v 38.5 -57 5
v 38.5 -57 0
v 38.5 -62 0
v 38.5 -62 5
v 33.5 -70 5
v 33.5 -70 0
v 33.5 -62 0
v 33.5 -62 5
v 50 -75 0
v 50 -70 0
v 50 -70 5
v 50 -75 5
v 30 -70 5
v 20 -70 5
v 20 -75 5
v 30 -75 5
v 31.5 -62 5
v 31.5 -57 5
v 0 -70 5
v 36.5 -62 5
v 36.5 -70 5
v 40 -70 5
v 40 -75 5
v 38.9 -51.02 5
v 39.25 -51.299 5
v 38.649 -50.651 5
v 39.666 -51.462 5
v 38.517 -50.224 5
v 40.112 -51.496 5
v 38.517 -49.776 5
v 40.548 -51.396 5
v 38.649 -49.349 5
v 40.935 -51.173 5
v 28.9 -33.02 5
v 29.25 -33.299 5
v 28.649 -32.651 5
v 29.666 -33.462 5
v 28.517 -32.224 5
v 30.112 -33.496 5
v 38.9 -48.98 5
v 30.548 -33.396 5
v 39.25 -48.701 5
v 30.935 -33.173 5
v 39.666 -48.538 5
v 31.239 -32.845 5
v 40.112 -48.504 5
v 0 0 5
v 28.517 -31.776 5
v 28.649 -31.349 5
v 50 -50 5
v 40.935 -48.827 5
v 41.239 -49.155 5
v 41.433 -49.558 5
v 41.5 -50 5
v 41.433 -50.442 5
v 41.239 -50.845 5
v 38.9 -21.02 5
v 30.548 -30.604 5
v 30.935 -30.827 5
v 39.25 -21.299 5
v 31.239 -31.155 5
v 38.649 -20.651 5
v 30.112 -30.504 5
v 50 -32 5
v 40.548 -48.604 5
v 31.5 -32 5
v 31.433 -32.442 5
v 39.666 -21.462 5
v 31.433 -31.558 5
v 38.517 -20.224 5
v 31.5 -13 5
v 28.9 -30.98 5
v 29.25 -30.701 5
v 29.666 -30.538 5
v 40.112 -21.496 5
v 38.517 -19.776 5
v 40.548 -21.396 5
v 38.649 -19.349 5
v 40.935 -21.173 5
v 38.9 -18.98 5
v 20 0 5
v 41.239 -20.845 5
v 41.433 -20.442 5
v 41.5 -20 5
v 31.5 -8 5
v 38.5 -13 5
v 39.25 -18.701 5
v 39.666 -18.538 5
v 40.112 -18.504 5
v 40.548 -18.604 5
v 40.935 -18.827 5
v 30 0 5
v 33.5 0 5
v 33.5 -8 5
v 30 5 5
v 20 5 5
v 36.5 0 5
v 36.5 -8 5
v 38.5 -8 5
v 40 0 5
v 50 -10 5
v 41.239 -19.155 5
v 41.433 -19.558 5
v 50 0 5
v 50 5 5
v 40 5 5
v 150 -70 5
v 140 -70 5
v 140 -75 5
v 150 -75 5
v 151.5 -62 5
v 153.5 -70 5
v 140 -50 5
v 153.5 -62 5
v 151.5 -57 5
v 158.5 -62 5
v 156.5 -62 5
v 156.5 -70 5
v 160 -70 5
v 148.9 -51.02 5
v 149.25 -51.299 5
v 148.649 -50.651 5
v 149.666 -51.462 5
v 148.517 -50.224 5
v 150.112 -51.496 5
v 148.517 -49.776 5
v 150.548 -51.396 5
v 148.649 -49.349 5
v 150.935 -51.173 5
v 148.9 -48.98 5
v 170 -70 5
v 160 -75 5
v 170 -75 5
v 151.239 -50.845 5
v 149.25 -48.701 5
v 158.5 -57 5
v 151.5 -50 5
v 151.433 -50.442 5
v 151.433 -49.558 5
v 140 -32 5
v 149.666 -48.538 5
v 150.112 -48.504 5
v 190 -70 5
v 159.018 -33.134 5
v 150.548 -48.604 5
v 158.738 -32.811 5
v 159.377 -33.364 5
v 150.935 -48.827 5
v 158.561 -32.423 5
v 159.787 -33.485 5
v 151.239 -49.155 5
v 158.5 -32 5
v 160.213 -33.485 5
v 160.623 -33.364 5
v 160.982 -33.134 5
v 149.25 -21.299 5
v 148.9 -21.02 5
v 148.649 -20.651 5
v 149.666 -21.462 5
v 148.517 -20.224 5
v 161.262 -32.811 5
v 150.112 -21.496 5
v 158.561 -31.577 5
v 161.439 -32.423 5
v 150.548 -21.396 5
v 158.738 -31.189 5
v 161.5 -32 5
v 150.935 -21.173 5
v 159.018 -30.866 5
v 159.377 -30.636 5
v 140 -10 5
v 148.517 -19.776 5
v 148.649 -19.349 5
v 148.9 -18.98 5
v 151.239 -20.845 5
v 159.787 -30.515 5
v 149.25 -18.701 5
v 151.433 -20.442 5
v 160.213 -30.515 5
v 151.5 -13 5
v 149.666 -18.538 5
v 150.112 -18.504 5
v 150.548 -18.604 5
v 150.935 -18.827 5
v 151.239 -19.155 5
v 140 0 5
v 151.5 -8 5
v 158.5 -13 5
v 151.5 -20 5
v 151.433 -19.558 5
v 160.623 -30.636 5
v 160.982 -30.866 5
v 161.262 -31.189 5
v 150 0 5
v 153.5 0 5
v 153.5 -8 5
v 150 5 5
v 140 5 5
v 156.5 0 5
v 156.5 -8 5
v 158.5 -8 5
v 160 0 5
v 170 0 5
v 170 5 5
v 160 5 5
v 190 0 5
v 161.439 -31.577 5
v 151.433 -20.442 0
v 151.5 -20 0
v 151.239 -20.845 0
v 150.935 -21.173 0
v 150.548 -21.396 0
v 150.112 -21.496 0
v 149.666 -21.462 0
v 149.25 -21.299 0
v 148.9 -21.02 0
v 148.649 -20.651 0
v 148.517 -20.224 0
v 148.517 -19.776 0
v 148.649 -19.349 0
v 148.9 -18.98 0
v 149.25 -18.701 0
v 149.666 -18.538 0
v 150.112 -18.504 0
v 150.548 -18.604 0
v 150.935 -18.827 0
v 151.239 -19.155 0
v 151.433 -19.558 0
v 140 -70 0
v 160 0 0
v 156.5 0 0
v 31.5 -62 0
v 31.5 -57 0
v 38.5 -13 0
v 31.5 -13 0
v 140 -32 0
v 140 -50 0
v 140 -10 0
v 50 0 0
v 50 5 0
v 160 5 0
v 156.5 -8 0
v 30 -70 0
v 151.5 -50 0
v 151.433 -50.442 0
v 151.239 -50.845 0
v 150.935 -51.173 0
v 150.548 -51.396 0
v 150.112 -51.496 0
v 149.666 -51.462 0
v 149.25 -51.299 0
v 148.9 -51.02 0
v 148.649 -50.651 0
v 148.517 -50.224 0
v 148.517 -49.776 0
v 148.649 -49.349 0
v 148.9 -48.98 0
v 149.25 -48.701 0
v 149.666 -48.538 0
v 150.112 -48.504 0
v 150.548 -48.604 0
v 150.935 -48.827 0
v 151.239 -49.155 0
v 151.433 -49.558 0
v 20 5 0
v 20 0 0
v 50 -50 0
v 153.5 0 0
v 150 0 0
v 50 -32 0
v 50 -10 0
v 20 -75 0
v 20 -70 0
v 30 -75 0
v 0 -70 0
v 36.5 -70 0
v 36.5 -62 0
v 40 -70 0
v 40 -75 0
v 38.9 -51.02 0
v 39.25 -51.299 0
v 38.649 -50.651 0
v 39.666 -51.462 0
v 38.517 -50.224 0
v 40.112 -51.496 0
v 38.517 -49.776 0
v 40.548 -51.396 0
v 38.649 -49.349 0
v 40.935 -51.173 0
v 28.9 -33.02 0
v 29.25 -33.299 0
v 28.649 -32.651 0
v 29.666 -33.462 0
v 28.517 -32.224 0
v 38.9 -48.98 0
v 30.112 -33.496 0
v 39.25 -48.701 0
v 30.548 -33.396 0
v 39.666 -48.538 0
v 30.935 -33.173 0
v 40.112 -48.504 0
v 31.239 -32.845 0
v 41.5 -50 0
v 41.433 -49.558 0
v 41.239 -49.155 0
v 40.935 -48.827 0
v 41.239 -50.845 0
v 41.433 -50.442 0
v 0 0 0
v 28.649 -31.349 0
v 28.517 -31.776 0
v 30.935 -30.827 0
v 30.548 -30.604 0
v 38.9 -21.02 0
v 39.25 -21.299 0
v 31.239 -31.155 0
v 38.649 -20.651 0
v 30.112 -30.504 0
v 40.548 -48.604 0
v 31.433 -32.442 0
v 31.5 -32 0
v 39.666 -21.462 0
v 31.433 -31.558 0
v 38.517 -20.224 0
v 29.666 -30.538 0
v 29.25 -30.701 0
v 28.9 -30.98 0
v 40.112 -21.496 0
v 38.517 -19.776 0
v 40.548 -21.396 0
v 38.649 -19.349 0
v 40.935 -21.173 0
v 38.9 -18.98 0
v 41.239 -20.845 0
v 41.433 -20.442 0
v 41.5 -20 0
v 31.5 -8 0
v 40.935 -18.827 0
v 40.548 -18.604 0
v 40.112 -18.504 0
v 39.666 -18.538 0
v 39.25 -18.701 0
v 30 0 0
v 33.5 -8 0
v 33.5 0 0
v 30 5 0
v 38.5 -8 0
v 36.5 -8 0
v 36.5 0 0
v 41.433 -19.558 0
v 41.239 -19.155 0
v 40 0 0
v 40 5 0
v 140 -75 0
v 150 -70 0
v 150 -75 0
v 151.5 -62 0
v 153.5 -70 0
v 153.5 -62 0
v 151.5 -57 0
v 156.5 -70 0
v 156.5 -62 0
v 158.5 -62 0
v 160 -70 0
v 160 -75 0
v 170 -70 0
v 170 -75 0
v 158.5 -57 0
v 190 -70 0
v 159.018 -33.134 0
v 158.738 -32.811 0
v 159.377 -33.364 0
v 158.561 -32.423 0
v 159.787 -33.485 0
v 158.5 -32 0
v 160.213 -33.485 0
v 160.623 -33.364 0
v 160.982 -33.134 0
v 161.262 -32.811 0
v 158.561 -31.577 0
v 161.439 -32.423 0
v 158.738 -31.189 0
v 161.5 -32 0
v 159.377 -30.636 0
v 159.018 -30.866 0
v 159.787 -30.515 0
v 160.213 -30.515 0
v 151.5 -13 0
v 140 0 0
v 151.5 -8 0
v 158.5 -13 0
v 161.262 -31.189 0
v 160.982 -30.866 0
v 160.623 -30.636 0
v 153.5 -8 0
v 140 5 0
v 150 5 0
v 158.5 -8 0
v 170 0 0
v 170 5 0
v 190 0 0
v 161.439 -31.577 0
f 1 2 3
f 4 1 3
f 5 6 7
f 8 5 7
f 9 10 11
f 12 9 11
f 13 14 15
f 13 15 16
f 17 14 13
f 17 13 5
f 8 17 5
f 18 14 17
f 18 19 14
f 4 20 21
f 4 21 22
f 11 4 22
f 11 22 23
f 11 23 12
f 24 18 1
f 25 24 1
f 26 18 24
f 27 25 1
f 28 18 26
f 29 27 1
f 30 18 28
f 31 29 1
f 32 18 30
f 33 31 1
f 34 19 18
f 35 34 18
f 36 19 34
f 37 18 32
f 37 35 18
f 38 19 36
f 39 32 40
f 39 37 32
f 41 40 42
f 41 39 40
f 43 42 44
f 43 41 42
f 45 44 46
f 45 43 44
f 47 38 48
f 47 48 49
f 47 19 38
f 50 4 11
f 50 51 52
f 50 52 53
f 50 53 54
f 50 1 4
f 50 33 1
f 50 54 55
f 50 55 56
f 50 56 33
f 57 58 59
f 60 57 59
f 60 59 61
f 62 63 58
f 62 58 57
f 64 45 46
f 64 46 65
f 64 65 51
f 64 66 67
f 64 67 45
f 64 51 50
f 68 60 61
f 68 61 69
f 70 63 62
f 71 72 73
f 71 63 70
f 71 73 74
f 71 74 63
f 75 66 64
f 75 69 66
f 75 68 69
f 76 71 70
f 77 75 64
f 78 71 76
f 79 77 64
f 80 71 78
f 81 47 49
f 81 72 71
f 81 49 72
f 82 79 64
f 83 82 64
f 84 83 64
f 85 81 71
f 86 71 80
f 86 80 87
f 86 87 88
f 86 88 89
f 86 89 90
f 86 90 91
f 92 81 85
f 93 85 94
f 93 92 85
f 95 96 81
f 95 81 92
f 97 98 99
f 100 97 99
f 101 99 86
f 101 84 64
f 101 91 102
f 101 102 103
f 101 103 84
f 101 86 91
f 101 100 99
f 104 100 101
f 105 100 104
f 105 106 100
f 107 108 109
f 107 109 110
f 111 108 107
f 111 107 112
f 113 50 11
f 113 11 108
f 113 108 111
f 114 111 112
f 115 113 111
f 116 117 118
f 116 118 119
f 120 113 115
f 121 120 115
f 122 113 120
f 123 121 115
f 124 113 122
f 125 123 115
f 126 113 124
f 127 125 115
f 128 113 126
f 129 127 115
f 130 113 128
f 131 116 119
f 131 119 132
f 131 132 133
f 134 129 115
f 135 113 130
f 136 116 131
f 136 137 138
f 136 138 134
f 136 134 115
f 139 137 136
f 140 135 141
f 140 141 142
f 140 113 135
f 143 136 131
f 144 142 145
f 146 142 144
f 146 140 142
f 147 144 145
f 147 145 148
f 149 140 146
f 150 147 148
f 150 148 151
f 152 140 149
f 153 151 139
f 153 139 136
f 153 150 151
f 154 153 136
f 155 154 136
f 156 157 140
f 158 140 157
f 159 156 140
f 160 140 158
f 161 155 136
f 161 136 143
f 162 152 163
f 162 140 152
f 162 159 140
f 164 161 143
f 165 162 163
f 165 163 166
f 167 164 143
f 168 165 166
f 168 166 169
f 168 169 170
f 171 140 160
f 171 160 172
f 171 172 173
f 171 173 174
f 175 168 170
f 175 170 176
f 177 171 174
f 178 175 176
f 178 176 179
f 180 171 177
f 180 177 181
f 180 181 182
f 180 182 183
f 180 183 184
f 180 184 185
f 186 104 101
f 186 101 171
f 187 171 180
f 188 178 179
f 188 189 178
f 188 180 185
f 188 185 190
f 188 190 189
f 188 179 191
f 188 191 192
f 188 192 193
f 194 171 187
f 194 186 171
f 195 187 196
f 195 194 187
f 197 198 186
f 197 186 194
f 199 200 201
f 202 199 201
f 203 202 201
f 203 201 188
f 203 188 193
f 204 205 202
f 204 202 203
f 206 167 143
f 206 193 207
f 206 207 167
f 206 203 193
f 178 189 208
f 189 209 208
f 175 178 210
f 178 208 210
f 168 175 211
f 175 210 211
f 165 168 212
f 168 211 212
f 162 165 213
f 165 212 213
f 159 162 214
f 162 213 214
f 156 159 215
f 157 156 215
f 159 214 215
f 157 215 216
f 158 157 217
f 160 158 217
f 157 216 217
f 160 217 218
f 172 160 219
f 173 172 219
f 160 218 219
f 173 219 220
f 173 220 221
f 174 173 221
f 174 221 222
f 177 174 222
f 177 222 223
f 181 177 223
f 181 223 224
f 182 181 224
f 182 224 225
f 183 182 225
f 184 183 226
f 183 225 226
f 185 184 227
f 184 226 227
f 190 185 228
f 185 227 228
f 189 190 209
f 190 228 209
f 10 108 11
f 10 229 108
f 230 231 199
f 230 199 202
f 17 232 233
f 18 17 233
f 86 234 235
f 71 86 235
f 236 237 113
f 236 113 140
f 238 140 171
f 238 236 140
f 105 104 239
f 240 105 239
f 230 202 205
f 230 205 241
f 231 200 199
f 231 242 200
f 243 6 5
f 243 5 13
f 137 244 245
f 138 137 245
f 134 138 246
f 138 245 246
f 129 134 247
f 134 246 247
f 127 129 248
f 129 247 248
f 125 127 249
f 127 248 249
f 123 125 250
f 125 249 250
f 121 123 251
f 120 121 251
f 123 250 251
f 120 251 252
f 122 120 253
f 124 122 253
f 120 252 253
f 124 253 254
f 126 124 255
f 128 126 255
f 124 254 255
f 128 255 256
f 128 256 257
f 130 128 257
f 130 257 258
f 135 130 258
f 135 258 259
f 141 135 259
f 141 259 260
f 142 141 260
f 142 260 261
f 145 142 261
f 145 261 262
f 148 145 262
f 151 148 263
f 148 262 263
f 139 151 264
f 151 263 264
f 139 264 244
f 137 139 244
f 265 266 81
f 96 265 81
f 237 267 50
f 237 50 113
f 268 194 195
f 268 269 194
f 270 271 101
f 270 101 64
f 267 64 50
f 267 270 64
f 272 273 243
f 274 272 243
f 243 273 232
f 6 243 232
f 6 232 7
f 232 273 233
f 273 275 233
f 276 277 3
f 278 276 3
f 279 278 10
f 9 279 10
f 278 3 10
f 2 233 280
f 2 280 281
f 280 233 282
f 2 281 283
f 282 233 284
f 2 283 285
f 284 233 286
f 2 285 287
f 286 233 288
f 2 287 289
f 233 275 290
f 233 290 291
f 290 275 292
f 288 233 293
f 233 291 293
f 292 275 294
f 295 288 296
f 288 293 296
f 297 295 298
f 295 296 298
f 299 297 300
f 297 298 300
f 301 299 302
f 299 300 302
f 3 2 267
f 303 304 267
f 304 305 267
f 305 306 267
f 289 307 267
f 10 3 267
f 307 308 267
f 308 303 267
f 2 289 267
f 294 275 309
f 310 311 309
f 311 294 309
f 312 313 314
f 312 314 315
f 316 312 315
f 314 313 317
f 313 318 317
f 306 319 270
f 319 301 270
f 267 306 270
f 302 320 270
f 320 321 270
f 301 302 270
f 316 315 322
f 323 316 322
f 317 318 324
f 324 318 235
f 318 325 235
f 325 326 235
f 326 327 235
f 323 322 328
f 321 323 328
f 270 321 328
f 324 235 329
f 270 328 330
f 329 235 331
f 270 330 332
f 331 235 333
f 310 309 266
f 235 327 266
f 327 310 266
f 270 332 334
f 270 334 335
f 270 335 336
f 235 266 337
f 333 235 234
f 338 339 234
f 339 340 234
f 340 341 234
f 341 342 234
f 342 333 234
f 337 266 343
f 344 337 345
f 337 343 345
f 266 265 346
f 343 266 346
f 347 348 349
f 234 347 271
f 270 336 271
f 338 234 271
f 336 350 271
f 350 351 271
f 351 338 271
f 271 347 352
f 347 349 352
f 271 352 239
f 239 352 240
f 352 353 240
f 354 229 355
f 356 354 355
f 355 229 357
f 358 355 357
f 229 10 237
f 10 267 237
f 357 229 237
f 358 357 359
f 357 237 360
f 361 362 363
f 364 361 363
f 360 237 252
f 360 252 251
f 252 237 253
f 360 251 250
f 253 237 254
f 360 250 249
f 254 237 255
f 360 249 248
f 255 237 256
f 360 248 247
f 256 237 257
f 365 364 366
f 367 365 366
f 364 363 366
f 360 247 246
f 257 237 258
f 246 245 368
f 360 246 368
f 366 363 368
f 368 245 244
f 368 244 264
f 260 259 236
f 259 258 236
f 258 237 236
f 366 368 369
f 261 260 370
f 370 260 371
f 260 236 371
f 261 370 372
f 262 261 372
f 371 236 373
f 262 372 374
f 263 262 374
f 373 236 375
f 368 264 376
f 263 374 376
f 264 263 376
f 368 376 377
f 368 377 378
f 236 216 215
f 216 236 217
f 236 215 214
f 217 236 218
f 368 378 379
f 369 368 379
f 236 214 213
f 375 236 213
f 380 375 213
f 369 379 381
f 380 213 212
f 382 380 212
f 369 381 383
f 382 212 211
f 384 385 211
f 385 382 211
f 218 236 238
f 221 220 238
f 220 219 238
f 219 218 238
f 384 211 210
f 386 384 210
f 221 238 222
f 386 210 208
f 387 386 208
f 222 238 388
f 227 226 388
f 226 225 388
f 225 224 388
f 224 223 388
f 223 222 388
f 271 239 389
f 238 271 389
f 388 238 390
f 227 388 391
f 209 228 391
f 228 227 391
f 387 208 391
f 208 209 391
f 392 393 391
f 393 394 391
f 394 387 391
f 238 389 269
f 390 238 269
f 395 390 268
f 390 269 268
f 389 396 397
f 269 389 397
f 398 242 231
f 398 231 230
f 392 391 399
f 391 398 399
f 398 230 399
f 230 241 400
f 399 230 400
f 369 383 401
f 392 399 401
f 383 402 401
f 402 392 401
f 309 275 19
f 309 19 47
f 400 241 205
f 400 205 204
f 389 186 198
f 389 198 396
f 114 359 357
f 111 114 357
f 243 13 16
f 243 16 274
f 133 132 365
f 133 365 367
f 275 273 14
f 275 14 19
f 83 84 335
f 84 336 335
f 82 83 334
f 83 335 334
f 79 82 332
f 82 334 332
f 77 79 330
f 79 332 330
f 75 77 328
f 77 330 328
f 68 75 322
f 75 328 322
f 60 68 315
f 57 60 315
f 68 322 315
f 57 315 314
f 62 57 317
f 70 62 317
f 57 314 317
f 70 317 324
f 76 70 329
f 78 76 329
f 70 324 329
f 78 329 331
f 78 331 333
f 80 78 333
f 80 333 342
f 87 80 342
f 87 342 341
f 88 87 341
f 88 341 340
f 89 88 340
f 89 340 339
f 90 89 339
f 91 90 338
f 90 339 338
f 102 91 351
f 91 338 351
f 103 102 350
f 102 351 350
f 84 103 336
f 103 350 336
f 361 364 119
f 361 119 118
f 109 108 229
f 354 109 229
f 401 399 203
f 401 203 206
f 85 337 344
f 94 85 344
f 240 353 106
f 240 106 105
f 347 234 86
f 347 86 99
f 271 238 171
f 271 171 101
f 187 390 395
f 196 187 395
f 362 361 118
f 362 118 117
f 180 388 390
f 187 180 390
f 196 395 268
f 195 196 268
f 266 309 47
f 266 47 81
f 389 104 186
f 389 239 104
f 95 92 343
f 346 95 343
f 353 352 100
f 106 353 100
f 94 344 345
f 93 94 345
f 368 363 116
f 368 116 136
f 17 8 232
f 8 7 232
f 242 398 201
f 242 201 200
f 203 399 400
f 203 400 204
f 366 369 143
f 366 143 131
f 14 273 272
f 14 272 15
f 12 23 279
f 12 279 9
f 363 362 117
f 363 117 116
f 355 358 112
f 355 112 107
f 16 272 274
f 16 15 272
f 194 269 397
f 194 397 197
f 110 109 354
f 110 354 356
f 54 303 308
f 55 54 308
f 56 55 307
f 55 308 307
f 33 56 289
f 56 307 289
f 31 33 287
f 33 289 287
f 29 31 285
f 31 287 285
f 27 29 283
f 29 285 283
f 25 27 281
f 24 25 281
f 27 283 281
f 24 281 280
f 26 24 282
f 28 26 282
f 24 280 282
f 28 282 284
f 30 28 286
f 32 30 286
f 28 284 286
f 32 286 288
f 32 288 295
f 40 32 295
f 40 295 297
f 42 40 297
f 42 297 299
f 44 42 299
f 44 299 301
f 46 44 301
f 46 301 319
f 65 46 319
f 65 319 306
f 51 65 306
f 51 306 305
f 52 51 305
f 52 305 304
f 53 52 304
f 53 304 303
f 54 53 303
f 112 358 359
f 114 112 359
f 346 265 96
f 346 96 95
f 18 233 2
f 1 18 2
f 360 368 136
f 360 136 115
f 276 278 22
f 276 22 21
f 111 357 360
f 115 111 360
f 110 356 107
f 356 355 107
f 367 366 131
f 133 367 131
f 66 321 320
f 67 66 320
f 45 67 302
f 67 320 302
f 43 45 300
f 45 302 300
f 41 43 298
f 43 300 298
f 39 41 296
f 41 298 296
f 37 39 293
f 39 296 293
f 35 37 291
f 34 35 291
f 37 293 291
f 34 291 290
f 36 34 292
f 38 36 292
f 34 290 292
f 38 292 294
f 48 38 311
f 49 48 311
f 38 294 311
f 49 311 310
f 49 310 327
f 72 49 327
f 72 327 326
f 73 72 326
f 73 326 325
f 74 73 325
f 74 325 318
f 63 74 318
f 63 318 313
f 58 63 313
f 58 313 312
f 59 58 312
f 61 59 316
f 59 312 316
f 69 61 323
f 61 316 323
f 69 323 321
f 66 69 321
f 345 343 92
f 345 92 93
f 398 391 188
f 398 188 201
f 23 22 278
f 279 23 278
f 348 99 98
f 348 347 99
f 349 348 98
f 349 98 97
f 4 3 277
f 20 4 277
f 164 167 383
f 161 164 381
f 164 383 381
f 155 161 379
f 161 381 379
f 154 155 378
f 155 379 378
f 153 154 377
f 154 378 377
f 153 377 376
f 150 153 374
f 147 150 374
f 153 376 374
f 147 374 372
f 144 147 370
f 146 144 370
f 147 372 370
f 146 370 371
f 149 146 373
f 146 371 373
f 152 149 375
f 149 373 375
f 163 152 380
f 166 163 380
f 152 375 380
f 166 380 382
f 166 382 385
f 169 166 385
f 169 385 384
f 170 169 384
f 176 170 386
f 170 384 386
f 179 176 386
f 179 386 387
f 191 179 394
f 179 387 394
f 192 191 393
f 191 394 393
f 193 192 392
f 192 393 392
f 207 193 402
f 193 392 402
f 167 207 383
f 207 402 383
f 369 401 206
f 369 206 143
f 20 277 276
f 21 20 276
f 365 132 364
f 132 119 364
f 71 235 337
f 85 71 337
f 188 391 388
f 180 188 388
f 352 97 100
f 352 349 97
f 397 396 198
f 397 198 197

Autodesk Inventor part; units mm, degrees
ref_plane "YZ Plane" through (0, 0, 0) normal (1, 0, 0) x (0, 1, 0)
ref_plane "XZ Plane" through (0, 0, 0) normal (0, 1, 0) x (-1, 0, 0)
ref_plane "XY Plane" through (0, 0, 0) normal (0, 0, 1) x (1, 0, 0)
sketch "Sketch1" plane through (0, 0, 0) normal (0, 0, 1) x (1, 0, 0)
  line L0 (0, 0) -> (190, 0)
  line L1 (190, 0) -> (190, -70)
  line L2 (190, -70) -> (0, -70)
  line L3 (0, -70) -> (0, 0)
  line L4 (0, 0) -> (0, -40)
  line L5 (0, 0) -> (0, -10)
  line L6 (50, -10) -> (50, -50)
  line L7 (50, -50) -> (140, -50)
  line L8 (140, -50) -> (140, -10)
  line L9 (140, -10) -> (50, -10)
  circle A0 centre (40, -20) radius 1.5
  circle A1 centre (150, -20) radius 1.5
  circle A2 centre (150, -50) radius 1.5
  circle A3 centre (40, -50) radius 1.5
  line L10 (50, -10) -> (50, -12)
  line L11 (50, -12) -> (50, -32)
  line L12 (50, -32) -> (30, -32)
  line L13 (140, -32) -> (160, -32)
  circle A4 centre (30, -32) radius 1.5
  circle A5 centre (160, -32) radius 1.5
  dimension "d0" = 190
  dimension "d1" = 70
  dimension "d116" = 40
  dimension "d118" = 50
  dimension "d119" = 40
  dimension "d120" = 90
  dimension "d125" = 3
  dimension "d126" = 3
  dimension "d127" = 3
  dimension "d128" = 3
  dimension "d130" = 20
  dimension "d131" = 20
  dimension "d132" = 20
  dimension "d133" = 3
  dimension "d134" = 3
  dimension "d140" = 20
  dimension "d141" = 20
  dimension "d145" = 18
  dimension "d146" = 18
extrude "Extrusion3" add sketch "Sketch1" along normal blind 5 contours L0 L1 L2 L3 | L9 L8 L7 L6 | A5 | A4 | A0 | A1 | A2 | A3
sketch "Sketch3" plane through (0, 0, 0) normal (0, 0, -1) x (-1, 0, 0)
  line L0 (0, 0) -> (-35, 0)
  line L1 (-35, 0) -> (-35, -13)
  line L2 (-35, -13) -> (-31.5, -13)
  line L3 (-35, -13) -> (-38.5, -13)
  line L4 (-38.5, -13) -> (-38.5, -8)
  line L5 (-38.5, -8) -> (-36.5, -8)
  line L6 (-36.5, -8) -> (-36.5, 0)
  line L7 (-31.5, -13) -> (-31.5, -8)
  line L8 (-31.5, -8) -> (-33.5, -8)
  line L9 (-33.5, -8) -> (-33.5, 0)
  line L10 (-35, 0) -> (-75, 0) construction
  line L11 (-75, 0) -> (-75, -13)
  line L12 (-75, -13) -> (-71.5, -13)
  line L13 (-75, -13) -> (-78.5, -13)
  line L14 (-78.5, -13) -> (-78.5, -8)
  line L15 (-78.5, -8) -> (-76.5, -8)
  line L16 (-71.5, -13) -> (-71.5, -8)
  line L17 (-71.5, -8) -> (-73.5, -8)
  line L18 (-73.5, -8) -> (-73.5, 0)
  line L19 (-76.5, -8) -> (-76.5, 0)
  line L20 (0, 0) -> (-190, 0) projected
  line L21 (-75, 0) -> (-115, 0)
  line L22 (-115, 0) -> (-115, -13)
  line L23 (-115, -13) -> (-111.5, -13)
  line L24 (-111.5, -13) -> (-111.5, -8)
  line L25 (-111.5, -8) -> (-113.5, -8)
  line L26 (-113.5, -8) -> (-113.5, 0)
  line L27 (-115, -13) -> (-118.5, -13)
  line L28 (-118.5, -13) -> (-118.5, -8)
  line L29 (-118.5, -8) -> (-116.5, -8)
  line L30 (-116.5, -8) -> (-116.5, 0)
  line L31 (-115, 0) -> (-155, 0)
  line L32 (-155, 0) -> (-155, -13)
  line L33 (-155, -13) -> (-151.5, -13)
  line L34 (-151.5, -13) -> (-151.5, -8)
  line L35 (-151.5, -8) -> (-153.5, -8)
  line L36 (-153.5, -8) -> (-153.5, 0)
  line L37 (-155, -13) -> (-158.5, -13)
  line L38 (-158.5, -13) -> (-158.5, -8)
  line L39 (-158.5, -8) -> (-156.5, -8)
  line L40 (-156.5, -8) -> (-156.5, 0)
  line L41 (-76.5, 0) -> (-73.5, 0)
  line L42 (-33.5, -8) -> (-31.5, -8)
  line L43 (-36.5, 0) -> (-33.5, 0)
  line L44 (-155, 0) -> (-155, -70)
  line L45 (-115, 0) -> (-115, -70)
  line L46 (-75, 0) -> (-75, -70)
  line L47 (-35, 0) -> (-35, -70)
  line L48 (-155, -70) -> (-153.5, -70)
  line L49 (-153.5, -70) -> (-153.5, -62)
  line L50 (-153.5, -62) -> (-151.5, -62)
  line L51 (-151.5, -62) -> (-151.5, -57)
  line L52 (-151.5, -57) -> (-155, -57)
  line L53 (-155, -70) -> (-156.5, -70)
  line L54 (-156.5, -70) -> (-156.5, -62)
  line L55 (-156.5, -62) -> (-158.5, -62)
  line L56 (-158.5, -62) -> (-158.5, -57)
  line L57 (-158.5, -57) -> (-155, -57)
  line L58 (-115, -70) -> (-113.5, -70)
  line L59 (-113.5, -70) -> (-113.5, -62)
  line L60 (-113.5, -62) -> (-111.5, -62)
  line L61 (-111.5, -62) -> (-111.5, -57)
  line L62 (-111.5, -57) -> (-115, -57)
  line L63 (-115, -70) -> (-116.5, -70)
  line L64 (-116.5, -70) -> (-116.5, -62)
  line L65 (-116.5, -62) -> (-118.5, -62)
  line L66 (-118.5, -62) -> (-118.5, -57)
  line L67 (-118.5, -57) -> (-115, -57)
  line L68 (-75, -70) -> (-73.5, -70)
  line L69 (-73.5, -70) -> (-73.5, -62)
  line L70 (-73.5, -62) -> (-71.5, -62)
  line L71 (-71.5, -62) -> (-71.5, -57)
  line L72 (-71.5, -57) -> (-75, -57)
  line L73 (-75, -70) -> (-76.5, -70)
  line L74 (-76.5, -70) -> (-76.5, -62)
  line L75 (-76.5, -62) -> (-78.5, -62)
  line L76 (-78.5, -62) -> (-78.5, -57)
  line L77 (-78.5, -57) -> (-75, -57)
  line L78 (-35, -70) -> (-33.5, -70)
  line L79 (-33.5, -70) -> (-33.5, -62)
  line L80 (-33.5, -62) -> (-31.5, -62)
  line L81 (-31.5, -62) -> (-31.5, -57)
  line L82 (-31.5, -57) -> (-38.5, -57)
  line L83 (-38.5, -57) -> (-38.5, -62)
  line L84 (-38.5, -62) -> (-36.5, -62)
  line L85 (-36.5, -62) -> (-36.5, -70)
  line L86 (-36.5, -70) -> (-35, -70)
  dimension "d14" = 35
  dimension "d15" = 13
  dimension "d16" = 3.5
  dimension "d17" = 3.5
  dimension "d18" = 5
  dimension "d19" = 2
  dimension "d20" = 2
  dimension "d21" = 40
  dimension "d22" = 13
  dimension "d23" = 3.5
  dimension "d24" = 3.5
  dimension "d25" = 5
  dimension "d26" = 2
  dimension "d27" = 2
  dimension "d28" = 40
  dimension "d29" = 8
  dimension "d30" = 13
  dimension "d31" = 40
  dimension "d32" = 13
  dimension "d33" = 3.5
  dimension "d34" = 5
  dimension "d35" = 2
  dimension "d36" = 3.5
  dimension "d37" = 5
  dimension "d38" = 2
  dimension "d39" = 40
  dimension "d40" = 13
  dimension "d41" = 3.5
  dimension "d42" = 5
  dimension "d43" = 2
  dimension "d44" = 3.5
  dimension "d45" = 5
  dimension "d46" = 2
  dimension "d63" = 8
  dimension "d66" = 1.5
  dimension "d67" = 5
  dimension "d68" = 1.5
  dimension "d69" = 2
  dimension "d70" = 5
  dimension "d71" = 1.5
  dimension "d72" = 2
  dimension "d73" = 8
  dimension "d74" = 2
  dimension "d75" = 1.5
extrude "Extrusion4" cut sketch "Sketch3" against normal blind 5 contours L32 L37 L38 L39 L40 L20
extrude "Extrusion5" cut sketch "Sketch3" against normal blind 5 contours L36 L35 L34 L33 L32 L20
extrude "Extrusion9" cut sketch "Sketch3" against normal blind 5 contours L9 L8 L7 L2 L1 L0
extrude "Extrusion10" cut sketch "Sketch3" against normal blind 5 contours L1 L3 L4 L5 L6 L20
extrude "Extrusion11" cut sketch "Sketch3" against normal blind 5 contours L44 L53 L54 L55 L56 L57
extrude "Extrusion12" cut sketch "Sketch3" against normal blind 5 contours L52 L51 L50 L49 L48 L44
extrude "Extrusion17" cut sketch "Sketch3" against normal blind 5 contours L82 L81 L80 L79 L78 L47 | L47 L86 L85 L84 L83 L82
sketch "Sketch4" plane through (153.5, -70, 0) normal (0, -1, 0) x (1, 0, 0)
  line L0 (-153.5, 0) -> (-133.5, 0)
  line L1 (-133.5, 0) -> (-133.5, 5)
  line L2 (-133.5, 5) -> (-123.5, 5)
  line L3 (-123.5, 5) -> (-123.5, 0)
  line L4 (-123.5, 0) -> (-133.5, 0)
  line L5 (-123.5, 5) -> (-113.5, 5)
  line L6 (-113.5, 5) -> (-113.5, 0)
  line L7 (-113.5, 0) -> (-103.5, 0)
  line L8 (-103.5, 0) -> (-103.5, 5)
  line L9 (-103.5, 5) -> (-113.5, 5)
  line L10 (-153.5, 0) -> (36.5, 0)
  line L11 (36.5, 0) -> (16.5, 0)
  line L12 (16.5, 0) -> (16.5, 5)
  line L13 (16.5, 5) -> (6.5, 5)
  line L14 (6.5, 5) -> (6.5, 0)
  line L15 (6.5, 0) -> (-3.5, 0)
  line L16 (-3.5, 0) -> (-3.5, 5)
  line L17 (-3.5, 5) -> (-13.5, 5)
  line L18 (-13.5, 5) -> (-13.5, 0)
  dimension "d90" = 20
  dimension "d91" = 5
  dimension "d92" = 10
  dimension "d93" = 10
  dimension "d94" = 10
  dimension "d95" = 190
  dimension "d96" = 20
  dimension "d97" = 10
  dimension "d98" = 10
  dimension "d99" = 10
extrude "Extrusion18" add sketch "Sketch4" along normal blind 5 contours L14 L13 L12 L10 | L18 L17 L16 L10 | L1 L2 L3 L4 | L6 L9 L8 L7
sketch "Sketch5" plane through (190, 0, 5) normal (0, 1, 0) x (1, 0, 0)
  line L0 (-190, 5) -> (-170, 5)
  line L1 (-170, 5) -> (-170, 0)
  line L2 (-170, 0) -> (-160, 0)
  line L3 (-160, 0) -> (-160, 5)
  line L4 (-160, 5) -> (-170, 5)
  line L5 (-160, 5) -> (-150, 5)
  line L6 (-150, 5) -> (-150, 0)
  line L7 (-150, 0) -> (-140, 0)
  line L8 (-140, 0) -> (-140, 5)
  line L9 (-140, 5) -> (-150, 5)
  line L10 (-190, 5) -> (0, 5)
  line L11 (0, 5) -> (-20, 5)
  line L12 (-20, 5) -> (-20, 0)
  line L13 (-20, 0) -> (-30, 0)
  line L14 (-30, 0) -> (-30, 5)
  line L15 (-30, 5) -> (-40, 5)
  line L16 (-40, 5) -> (-40, 0)
  line L17 (-40, 0) -> (-50, 0)
  line L18 (-50, 0) -> (-50, 5)
  dimension "d102" = 20
  dimension "d103" = 5
  dimension "d104" = 10
  dimension "d105" = 10
  dimension "d106" = 10
  dimension "d107" = 190
  dimension "d108" = 20
  dimension "d109" = 5
  dimension "d110" = 10
  dimension "d111" = 10
  dimension "d112" = 5
  dimension "d113" = 10
extrude "Extrusion19" add sketch "Sketch5" along normal blind 5
extrude "Extrusion20" cut sketch "Sketch1" along normal blind 10 contours L9 L8 L7 L6
extrude "Extrusion22" cut sketch "Sketch1" along normal blind 10 contours A5 | A4 | A0 | A1 | A2 | A3
properties part number "lateral_mdf2"
